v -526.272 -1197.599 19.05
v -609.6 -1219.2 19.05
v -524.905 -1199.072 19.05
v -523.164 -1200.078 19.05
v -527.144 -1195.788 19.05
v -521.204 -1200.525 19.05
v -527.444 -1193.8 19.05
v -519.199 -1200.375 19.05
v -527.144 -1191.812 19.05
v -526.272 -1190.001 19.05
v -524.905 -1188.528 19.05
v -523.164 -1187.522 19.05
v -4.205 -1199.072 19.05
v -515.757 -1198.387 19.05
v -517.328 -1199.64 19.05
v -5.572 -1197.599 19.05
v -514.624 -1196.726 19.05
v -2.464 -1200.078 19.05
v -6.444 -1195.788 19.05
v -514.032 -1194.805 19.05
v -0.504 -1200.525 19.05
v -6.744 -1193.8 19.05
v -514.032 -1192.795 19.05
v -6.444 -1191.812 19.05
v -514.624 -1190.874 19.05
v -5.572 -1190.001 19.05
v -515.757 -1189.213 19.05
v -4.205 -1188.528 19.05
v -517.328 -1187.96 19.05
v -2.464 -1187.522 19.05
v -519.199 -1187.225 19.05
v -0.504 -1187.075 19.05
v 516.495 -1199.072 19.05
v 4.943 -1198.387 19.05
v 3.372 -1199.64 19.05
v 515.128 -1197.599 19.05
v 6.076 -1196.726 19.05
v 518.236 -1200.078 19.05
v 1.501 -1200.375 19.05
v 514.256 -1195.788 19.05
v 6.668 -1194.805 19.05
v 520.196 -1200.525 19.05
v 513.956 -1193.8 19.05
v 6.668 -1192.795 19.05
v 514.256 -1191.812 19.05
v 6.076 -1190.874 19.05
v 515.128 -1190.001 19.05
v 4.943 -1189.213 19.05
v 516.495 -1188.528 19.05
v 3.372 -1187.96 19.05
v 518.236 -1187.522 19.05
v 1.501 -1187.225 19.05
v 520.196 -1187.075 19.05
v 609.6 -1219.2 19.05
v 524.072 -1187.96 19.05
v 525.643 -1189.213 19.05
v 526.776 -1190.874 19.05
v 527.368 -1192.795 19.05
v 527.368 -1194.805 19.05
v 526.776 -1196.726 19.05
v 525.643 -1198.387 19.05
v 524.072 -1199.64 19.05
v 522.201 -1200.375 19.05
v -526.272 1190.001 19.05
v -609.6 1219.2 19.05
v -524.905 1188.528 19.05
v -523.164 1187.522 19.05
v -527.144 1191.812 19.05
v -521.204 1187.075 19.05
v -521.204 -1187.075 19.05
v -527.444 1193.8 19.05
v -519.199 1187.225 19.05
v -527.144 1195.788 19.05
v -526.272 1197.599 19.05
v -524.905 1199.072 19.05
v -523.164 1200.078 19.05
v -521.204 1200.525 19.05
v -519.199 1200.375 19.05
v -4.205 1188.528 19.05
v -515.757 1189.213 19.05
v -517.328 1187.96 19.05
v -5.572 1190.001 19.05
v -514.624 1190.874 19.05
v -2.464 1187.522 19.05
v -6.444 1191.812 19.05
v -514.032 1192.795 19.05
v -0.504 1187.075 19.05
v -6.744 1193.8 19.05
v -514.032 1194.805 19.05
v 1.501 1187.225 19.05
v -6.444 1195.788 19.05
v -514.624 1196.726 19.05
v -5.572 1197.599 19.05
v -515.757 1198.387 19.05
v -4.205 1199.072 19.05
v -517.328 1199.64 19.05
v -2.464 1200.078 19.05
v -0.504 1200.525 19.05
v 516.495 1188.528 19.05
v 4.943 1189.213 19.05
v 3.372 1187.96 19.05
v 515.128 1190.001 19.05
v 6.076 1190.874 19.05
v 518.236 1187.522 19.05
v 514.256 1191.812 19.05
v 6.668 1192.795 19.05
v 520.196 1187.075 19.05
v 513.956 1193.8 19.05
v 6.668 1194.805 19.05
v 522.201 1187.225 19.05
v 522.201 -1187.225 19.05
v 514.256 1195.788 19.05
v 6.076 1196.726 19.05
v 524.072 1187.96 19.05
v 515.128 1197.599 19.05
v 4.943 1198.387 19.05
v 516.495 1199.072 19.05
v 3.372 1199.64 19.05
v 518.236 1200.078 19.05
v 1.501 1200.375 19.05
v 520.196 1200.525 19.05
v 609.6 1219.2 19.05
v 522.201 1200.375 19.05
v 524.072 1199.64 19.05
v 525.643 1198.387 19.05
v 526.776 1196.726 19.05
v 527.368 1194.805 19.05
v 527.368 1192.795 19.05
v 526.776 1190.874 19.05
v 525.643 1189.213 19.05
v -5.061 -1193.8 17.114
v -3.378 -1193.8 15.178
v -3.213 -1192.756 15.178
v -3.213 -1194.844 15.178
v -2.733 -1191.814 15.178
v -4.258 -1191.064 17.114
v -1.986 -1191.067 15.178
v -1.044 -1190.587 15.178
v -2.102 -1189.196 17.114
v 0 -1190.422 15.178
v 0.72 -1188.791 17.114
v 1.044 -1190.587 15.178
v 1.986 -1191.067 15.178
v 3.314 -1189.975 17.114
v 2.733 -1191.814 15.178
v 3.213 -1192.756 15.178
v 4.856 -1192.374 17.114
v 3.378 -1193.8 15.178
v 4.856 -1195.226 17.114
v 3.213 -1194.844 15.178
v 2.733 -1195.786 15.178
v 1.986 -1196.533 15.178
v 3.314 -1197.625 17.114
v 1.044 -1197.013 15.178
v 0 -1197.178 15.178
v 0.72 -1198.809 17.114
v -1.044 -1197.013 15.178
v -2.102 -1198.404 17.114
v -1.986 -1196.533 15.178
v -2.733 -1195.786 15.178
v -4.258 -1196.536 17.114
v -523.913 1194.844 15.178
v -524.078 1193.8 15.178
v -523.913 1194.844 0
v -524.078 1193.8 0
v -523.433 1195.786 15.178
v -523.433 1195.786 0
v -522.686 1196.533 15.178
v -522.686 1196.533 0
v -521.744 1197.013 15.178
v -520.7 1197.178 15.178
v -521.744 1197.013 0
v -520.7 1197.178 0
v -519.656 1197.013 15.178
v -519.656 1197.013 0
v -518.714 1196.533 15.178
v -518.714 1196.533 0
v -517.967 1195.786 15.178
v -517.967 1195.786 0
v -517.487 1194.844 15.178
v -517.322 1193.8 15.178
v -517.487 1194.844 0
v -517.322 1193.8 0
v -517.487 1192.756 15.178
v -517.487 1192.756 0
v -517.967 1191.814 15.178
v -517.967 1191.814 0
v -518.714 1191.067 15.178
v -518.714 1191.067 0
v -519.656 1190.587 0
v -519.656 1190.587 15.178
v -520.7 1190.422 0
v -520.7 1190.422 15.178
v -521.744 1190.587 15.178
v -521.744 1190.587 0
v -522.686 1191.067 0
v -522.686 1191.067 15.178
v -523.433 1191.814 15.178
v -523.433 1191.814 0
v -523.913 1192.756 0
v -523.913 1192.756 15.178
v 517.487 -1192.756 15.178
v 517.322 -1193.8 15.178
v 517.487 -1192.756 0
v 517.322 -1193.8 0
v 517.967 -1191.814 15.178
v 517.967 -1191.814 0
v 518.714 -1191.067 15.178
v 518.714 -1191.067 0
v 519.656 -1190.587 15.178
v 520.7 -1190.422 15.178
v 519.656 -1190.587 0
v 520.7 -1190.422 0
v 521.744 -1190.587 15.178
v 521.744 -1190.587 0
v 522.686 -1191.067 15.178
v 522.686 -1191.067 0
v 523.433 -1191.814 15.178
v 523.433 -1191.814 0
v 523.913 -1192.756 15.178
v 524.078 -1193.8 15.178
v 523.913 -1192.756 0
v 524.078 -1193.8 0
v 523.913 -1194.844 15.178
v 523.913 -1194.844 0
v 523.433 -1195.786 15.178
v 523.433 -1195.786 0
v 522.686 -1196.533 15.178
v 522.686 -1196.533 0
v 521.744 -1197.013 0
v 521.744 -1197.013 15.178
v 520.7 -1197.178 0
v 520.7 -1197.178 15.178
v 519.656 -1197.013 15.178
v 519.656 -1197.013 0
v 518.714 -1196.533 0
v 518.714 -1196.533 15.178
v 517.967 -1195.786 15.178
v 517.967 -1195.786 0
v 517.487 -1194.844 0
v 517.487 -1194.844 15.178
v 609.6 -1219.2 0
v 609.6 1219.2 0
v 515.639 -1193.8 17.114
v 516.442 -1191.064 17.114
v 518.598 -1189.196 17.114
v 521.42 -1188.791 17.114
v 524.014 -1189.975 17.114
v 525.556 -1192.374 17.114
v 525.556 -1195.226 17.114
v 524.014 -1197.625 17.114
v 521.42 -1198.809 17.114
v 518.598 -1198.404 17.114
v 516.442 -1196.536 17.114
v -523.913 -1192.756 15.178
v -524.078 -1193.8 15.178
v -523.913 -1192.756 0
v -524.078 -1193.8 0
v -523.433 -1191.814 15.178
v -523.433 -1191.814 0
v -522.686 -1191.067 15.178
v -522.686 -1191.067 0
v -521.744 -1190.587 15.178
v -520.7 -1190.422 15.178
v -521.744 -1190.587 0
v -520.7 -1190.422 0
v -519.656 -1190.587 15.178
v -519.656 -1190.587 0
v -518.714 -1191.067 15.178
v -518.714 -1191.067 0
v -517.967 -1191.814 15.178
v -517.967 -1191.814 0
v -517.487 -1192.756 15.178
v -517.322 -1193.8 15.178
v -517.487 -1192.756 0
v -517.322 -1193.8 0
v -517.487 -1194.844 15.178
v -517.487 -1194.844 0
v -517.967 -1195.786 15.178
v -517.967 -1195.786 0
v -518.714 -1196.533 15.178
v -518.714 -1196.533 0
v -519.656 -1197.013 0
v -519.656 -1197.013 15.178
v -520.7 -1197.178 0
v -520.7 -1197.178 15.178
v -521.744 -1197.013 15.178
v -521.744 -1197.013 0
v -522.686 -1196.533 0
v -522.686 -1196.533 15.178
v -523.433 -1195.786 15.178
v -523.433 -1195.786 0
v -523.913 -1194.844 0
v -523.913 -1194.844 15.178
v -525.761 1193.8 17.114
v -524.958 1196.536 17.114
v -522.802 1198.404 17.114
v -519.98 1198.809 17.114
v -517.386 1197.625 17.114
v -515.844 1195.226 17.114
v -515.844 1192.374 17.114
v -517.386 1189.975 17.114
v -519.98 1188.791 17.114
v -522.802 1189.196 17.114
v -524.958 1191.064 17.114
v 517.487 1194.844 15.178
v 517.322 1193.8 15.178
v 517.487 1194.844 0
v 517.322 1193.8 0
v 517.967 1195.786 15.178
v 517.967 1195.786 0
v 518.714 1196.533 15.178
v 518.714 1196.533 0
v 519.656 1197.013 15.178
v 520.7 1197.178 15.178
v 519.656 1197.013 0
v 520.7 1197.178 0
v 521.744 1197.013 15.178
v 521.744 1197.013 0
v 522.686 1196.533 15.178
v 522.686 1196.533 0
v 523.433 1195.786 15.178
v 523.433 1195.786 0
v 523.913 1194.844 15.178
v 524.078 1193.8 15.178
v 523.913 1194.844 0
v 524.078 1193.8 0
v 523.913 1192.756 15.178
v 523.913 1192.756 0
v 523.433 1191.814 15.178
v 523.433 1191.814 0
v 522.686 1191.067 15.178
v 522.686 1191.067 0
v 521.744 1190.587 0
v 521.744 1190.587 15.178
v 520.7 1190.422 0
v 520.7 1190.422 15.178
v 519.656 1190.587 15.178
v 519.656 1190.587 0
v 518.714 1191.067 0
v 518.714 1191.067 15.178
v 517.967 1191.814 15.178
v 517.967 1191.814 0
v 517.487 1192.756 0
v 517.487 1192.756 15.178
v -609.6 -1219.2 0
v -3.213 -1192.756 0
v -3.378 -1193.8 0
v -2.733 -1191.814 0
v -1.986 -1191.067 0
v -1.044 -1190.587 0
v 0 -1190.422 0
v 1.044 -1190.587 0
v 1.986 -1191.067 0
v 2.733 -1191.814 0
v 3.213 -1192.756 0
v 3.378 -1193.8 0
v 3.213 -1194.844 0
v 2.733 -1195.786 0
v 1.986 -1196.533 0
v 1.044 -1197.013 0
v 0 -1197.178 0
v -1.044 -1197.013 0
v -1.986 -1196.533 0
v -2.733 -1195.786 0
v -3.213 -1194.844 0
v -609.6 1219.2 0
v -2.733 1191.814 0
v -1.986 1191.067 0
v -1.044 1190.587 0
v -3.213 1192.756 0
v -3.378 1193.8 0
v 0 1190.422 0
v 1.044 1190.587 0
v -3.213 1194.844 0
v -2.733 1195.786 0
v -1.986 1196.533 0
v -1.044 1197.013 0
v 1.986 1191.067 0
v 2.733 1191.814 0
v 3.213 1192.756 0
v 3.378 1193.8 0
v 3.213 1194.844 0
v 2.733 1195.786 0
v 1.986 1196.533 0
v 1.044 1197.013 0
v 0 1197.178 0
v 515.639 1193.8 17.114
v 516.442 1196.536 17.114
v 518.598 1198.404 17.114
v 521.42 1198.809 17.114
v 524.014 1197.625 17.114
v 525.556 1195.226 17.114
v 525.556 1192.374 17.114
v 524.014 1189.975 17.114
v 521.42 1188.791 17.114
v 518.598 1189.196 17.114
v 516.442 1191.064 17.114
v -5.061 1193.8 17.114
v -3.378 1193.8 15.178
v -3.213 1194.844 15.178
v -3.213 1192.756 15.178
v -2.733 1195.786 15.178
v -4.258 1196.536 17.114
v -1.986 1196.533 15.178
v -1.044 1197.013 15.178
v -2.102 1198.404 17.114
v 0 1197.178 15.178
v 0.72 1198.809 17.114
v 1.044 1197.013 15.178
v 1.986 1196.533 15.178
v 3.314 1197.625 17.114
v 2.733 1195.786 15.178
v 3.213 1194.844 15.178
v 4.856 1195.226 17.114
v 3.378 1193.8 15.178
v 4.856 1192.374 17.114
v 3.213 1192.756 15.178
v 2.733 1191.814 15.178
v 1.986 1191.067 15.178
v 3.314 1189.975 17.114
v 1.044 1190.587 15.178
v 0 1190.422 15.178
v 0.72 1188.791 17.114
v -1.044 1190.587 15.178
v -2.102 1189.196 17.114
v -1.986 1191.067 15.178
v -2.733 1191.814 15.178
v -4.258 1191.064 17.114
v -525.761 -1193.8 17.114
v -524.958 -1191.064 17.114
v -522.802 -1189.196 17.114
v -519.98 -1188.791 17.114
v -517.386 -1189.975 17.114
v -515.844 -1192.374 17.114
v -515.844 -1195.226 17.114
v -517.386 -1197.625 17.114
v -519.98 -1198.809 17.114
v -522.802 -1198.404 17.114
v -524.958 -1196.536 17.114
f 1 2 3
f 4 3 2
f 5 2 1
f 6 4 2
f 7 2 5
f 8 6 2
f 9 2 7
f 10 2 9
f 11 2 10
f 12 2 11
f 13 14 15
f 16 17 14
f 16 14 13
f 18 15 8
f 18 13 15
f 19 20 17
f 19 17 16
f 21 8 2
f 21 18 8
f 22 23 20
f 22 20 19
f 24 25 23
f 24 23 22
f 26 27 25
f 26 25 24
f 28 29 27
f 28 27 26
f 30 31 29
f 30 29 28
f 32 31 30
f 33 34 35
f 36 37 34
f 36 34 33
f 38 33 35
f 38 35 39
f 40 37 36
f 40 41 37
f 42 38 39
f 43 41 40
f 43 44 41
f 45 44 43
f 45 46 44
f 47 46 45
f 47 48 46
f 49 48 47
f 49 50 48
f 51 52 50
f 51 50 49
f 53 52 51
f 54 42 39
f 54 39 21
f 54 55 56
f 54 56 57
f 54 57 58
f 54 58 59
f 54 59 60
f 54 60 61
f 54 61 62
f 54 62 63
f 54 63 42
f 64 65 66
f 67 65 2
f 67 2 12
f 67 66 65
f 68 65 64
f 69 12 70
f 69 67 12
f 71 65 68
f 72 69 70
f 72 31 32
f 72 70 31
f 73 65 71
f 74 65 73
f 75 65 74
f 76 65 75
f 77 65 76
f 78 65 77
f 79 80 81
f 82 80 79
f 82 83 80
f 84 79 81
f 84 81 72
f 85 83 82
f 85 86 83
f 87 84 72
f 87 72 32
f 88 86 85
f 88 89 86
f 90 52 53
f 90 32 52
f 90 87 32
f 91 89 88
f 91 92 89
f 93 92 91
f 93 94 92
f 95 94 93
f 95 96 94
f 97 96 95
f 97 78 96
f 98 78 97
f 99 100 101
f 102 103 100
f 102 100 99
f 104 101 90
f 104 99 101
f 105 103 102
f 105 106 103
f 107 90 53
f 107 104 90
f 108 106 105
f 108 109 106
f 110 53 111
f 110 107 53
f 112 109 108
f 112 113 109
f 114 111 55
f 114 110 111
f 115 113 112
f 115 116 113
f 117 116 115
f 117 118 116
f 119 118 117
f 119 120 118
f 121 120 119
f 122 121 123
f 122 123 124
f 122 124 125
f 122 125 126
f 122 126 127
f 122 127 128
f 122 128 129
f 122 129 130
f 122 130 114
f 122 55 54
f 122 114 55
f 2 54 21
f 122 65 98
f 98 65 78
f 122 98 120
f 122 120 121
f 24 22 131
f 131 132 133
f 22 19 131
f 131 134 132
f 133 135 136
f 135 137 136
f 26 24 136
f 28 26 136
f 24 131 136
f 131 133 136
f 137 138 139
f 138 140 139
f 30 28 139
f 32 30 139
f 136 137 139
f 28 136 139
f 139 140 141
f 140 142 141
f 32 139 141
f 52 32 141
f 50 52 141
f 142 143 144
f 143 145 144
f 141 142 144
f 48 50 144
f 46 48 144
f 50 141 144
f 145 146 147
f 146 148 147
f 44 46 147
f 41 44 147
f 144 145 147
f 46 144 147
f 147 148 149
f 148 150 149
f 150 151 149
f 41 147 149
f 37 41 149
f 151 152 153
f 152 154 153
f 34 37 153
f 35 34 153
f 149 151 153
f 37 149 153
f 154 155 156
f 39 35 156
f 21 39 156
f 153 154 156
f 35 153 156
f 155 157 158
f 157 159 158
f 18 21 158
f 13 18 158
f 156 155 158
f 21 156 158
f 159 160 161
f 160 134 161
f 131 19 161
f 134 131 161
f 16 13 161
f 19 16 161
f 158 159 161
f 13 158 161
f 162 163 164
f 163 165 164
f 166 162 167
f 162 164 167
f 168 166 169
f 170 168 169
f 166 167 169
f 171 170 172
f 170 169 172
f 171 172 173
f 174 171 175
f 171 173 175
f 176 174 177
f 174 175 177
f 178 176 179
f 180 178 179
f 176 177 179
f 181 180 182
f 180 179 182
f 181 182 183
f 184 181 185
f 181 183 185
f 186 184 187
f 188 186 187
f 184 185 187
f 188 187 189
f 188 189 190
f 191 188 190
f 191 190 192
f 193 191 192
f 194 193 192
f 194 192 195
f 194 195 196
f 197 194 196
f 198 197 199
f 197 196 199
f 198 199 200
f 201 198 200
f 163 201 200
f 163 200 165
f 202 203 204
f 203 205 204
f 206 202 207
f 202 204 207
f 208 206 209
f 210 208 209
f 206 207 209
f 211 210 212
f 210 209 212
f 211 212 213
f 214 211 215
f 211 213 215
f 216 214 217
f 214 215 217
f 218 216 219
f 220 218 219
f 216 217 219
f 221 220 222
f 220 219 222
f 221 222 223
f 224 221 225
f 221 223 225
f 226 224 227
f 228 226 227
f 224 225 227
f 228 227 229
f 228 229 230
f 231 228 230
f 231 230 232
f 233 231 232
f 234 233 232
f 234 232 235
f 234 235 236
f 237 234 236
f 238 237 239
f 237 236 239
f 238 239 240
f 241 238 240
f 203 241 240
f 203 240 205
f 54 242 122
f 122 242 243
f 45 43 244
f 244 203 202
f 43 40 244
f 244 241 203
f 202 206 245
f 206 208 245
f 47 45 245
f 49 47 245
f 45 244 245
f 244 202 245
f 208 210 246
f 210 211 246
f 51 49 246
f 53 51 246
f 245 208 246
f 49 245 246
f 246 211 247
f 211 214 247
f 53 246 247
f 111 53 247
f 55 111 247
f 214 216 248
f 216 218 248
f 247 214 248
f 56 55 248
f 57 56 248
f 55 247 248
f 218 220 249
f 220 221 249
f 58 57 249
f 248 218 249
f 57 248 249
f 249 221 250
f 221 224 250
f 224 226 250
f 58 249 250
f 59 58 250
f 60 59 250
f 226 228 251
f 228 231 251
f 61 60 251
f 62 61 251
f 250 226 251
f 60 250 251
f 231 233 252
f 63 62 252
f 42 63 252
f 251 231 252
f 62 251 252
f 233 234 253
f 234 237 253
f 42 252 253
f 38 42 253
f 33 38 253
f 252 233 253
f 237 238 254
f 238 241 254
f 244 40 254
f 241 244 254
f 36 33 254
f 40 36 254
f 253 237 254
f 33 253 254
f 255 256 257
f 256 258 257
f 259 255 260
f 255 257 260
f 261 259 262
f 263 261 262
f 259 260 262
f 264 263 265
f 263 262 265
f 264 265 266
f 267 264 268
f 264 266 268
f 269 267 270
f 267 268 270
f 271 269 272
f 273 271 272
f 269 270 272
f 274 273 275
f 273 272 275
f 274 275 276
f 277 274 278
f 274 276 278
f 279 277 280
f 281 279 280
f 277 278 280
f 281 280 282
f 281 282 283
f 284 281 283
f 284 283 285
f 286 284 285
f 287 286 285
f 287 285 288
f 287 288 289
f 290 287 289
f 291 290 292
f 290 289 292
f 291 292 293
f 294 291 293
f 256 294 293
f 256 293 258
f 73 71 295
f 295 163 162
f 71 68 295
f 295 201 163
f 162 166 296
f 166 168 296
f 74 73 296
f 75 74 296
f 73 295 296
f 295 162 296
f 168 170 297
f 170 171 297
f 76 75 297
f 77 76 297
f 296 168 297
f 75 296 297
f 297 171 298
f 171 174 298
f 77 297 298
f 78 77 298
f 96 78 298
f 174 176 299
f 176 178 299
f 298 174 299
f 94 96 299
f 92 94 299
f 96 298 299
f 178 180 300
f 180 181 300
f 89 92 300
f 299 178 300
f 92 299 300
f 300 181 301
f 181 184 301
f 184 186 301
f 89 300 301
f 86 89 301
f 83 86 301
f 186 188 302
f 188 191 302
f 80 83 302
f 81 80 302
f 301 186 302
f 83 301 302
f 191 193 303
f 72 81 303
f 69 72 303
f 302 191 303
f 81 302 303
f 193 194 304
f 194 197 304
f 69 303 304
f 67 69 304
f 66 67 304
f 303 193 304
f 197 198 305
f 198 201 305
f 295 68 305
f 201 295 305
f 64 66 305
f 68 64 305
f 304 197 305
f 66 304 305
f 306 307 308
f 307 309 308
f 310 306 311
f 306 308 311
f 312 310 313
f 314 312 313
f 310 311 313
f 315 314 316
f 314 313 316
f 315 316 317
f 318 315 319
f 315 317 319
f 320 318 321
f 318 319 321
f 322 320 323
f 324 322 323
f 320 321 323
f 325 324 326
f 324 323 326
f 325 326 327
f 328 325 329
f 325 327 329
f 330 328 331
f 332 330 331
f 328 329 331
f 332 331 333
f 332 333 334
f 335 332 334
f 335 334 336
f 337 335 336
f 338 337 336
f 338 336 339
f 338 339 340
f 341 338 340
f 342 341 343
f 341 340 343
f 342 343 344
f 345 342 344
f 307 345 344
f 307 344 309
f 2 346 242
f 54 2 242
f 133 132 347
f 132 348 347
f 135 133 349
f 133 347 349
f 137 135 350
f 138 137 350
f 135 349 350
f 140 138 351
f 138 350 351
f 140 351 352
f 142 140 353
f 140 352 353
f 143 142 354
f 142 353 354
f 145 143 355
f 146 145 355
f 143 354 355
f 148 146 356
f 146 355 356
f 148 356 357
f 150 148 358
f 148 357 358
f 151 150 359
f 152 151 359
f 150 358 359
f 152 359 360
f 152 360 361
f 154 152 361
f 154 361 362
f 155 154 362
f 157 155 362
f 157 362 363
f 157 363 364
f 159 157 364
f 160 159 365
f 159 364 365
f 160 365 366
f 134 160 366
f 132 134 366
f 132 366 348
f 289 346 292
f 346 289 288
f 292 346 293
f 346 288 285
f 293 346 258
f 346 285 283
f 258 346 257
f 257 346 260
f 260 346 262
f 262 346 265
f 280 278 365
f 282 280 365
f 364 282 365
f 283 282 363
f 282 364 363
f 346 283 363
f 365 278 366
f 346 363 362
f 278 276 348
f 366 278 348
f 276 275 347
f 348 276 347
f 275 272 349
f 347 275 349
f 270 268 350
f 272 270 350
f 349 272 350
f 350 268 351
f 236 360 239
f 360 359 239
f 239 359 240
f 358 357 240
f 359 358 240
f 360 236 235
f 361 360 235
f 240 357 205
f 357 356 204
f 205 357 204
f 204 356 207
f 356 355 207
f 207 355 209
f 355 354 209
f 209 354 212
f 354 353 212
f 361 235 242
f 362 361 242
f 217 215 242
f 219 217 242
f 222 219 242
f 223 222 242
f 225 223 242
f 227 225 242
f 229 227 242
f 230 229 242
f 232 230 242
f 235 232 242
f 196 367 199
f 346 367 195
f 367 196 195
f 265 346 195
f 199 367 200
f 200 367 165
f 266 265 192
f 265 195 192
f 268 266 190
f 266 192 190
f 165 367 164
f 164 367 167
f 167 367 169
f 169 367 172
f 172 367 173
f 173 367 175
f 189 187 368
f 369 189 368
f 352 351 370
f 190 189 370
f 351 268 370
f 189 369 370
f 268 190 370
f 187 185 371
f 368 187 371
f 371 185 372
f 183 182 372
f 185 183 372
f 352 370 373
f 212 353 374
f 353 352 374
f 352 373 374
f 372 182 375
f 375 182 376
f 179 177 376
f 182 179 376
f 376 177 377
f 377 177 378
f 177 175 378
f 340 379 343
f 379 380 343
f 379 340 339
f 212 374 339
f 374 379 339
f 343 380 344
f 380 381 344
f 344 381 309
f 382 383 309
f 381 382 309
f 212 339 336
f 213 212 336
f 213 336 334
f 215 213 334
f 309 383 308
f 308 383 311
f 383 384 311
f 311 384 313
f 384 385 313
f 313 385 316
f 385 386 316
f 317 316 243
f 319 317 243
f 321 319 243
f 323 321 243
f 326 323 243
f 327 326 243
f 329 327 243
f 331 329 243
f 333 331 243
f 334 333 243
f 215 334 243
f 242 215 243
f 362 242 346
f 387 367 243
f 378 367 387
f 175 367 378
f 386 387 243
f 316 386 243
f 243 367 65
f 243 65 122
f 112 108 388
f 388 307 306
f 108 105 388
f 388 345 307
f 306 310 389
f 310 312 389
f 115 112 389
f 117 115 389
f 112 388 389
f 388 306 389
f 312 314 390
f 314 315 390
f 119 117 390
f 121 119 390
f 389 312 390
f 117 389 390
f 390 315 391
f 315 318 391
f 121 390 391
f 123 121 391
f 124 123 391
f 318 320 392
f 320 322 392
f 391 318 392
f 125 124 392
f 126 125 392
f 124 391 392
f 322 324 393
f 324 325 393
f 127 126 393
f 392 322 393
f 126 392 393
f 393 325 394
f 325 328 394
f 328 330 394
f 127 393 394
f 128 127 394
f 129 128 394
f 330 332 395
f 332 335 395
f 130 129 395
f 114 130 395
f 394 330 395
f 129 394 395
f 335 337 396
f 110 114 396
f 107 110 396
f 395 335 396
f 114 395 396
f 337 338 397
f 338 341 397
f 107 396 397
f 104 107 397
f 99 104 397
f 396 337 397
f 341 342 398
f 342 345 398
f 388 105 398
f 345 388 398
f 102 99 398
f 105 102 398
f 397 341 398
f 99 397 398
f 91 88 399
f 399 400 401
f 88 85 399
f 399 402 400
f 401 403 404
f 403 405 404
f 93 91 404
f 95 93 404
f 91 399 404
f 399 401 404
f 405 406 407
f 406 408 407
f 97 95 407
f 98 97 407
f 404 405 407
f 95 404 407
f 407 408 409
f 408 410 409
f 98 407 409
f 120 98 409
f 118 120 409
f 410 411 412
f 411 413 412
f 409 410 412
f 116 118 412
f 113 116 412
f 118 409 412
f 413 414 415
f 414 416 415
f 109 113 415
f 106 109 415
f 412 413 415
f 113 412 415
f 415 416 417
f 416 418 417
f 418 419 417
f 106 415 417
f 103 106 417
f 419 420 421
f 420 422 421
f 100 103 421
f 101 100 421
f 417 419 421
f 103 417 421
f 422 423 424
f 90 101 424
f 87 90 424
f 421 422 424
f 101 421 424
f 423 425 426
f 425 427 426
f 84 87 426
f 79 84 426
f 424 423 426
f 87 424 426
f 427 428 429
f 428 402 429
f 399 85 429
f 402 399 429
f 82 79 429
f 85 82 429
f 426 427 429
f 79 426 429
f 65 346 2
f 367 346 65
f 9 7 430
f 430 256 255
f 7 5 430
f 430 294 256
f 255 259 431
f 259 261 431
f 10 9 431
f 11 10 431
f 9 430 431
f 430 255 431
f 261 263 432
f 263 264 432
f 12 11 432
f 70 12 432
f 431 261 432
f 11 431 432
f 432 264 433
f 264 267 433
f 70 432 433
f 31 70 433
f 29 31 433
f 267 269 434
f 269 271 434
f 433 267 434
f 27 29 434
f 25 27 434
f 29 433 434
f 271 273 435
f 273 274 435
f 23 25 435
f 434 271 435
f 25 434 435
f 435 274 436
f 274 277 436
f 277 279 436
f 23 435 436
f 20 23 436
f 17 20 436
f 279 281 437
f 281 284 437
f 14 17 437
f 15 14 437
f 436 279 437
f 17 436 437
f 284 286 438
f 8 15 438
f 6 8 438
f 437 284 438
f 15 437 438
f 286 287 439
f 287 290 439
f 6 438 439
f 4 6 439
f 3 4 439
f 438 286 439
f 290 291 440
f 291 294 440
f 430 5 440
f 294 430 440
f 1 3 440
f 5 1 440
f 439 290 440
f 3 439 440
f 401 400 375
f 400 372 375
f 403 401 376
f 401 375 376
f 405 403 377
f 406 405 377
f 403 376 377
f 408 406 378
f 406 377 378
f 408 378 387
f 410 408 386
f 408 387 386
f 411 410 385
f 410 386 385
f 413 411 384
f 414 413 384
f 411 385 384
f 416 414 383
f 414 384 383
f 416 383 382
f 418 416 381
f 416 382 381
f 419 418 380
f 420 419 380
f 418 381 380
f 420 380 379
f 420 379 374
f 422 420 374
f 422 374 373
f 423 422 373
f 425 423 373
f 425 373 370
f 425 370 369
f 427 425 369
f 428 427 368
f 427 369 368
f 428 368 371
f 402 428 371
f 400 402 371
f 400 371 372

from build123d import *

# Parameters (mm, degrees)
F0_W           = 1219.2
F0_H           = 2438.4
F1_DEPTH       = 19.05
F3_D           = 6.7564
F3_DEPTH       = 25.4
F3_CSINK_D     = 13.4874
F3_CSINK_ANGLE = 82
F3_TIP         = 2.0298273432


with BuildPart() as f1:
    # F0 (on Top) → F1 (new body)
    with BuildSketch(Plane.XY):
        Rectangle(F0_W, F0_H)
    extrude(amount=F1_DEPTH)

    # F3
    with Locations(Plane.XY.offset(19.05)):
        with Locations((-520.7, -1193.8), (0, -1193.8), (520.7, -1193.8), (520.7, 1193.8), (0, 1193.8), (-520.7, 1193.8)):
            CounterSinkHole(F3_D / 2, F3_CSINK_D / 2, depth=F3_DEPTH, counter_sink_angle=F3_CSINK_ANGLE)
            with Locations((0, 0, -(F3_DEPTH + F3_TIP / 2))):  # 118° drill point
                Cone(0, F3_D / 2, F3_TIP, mode=Mode.SUBTRACT)


solid = f1.part
